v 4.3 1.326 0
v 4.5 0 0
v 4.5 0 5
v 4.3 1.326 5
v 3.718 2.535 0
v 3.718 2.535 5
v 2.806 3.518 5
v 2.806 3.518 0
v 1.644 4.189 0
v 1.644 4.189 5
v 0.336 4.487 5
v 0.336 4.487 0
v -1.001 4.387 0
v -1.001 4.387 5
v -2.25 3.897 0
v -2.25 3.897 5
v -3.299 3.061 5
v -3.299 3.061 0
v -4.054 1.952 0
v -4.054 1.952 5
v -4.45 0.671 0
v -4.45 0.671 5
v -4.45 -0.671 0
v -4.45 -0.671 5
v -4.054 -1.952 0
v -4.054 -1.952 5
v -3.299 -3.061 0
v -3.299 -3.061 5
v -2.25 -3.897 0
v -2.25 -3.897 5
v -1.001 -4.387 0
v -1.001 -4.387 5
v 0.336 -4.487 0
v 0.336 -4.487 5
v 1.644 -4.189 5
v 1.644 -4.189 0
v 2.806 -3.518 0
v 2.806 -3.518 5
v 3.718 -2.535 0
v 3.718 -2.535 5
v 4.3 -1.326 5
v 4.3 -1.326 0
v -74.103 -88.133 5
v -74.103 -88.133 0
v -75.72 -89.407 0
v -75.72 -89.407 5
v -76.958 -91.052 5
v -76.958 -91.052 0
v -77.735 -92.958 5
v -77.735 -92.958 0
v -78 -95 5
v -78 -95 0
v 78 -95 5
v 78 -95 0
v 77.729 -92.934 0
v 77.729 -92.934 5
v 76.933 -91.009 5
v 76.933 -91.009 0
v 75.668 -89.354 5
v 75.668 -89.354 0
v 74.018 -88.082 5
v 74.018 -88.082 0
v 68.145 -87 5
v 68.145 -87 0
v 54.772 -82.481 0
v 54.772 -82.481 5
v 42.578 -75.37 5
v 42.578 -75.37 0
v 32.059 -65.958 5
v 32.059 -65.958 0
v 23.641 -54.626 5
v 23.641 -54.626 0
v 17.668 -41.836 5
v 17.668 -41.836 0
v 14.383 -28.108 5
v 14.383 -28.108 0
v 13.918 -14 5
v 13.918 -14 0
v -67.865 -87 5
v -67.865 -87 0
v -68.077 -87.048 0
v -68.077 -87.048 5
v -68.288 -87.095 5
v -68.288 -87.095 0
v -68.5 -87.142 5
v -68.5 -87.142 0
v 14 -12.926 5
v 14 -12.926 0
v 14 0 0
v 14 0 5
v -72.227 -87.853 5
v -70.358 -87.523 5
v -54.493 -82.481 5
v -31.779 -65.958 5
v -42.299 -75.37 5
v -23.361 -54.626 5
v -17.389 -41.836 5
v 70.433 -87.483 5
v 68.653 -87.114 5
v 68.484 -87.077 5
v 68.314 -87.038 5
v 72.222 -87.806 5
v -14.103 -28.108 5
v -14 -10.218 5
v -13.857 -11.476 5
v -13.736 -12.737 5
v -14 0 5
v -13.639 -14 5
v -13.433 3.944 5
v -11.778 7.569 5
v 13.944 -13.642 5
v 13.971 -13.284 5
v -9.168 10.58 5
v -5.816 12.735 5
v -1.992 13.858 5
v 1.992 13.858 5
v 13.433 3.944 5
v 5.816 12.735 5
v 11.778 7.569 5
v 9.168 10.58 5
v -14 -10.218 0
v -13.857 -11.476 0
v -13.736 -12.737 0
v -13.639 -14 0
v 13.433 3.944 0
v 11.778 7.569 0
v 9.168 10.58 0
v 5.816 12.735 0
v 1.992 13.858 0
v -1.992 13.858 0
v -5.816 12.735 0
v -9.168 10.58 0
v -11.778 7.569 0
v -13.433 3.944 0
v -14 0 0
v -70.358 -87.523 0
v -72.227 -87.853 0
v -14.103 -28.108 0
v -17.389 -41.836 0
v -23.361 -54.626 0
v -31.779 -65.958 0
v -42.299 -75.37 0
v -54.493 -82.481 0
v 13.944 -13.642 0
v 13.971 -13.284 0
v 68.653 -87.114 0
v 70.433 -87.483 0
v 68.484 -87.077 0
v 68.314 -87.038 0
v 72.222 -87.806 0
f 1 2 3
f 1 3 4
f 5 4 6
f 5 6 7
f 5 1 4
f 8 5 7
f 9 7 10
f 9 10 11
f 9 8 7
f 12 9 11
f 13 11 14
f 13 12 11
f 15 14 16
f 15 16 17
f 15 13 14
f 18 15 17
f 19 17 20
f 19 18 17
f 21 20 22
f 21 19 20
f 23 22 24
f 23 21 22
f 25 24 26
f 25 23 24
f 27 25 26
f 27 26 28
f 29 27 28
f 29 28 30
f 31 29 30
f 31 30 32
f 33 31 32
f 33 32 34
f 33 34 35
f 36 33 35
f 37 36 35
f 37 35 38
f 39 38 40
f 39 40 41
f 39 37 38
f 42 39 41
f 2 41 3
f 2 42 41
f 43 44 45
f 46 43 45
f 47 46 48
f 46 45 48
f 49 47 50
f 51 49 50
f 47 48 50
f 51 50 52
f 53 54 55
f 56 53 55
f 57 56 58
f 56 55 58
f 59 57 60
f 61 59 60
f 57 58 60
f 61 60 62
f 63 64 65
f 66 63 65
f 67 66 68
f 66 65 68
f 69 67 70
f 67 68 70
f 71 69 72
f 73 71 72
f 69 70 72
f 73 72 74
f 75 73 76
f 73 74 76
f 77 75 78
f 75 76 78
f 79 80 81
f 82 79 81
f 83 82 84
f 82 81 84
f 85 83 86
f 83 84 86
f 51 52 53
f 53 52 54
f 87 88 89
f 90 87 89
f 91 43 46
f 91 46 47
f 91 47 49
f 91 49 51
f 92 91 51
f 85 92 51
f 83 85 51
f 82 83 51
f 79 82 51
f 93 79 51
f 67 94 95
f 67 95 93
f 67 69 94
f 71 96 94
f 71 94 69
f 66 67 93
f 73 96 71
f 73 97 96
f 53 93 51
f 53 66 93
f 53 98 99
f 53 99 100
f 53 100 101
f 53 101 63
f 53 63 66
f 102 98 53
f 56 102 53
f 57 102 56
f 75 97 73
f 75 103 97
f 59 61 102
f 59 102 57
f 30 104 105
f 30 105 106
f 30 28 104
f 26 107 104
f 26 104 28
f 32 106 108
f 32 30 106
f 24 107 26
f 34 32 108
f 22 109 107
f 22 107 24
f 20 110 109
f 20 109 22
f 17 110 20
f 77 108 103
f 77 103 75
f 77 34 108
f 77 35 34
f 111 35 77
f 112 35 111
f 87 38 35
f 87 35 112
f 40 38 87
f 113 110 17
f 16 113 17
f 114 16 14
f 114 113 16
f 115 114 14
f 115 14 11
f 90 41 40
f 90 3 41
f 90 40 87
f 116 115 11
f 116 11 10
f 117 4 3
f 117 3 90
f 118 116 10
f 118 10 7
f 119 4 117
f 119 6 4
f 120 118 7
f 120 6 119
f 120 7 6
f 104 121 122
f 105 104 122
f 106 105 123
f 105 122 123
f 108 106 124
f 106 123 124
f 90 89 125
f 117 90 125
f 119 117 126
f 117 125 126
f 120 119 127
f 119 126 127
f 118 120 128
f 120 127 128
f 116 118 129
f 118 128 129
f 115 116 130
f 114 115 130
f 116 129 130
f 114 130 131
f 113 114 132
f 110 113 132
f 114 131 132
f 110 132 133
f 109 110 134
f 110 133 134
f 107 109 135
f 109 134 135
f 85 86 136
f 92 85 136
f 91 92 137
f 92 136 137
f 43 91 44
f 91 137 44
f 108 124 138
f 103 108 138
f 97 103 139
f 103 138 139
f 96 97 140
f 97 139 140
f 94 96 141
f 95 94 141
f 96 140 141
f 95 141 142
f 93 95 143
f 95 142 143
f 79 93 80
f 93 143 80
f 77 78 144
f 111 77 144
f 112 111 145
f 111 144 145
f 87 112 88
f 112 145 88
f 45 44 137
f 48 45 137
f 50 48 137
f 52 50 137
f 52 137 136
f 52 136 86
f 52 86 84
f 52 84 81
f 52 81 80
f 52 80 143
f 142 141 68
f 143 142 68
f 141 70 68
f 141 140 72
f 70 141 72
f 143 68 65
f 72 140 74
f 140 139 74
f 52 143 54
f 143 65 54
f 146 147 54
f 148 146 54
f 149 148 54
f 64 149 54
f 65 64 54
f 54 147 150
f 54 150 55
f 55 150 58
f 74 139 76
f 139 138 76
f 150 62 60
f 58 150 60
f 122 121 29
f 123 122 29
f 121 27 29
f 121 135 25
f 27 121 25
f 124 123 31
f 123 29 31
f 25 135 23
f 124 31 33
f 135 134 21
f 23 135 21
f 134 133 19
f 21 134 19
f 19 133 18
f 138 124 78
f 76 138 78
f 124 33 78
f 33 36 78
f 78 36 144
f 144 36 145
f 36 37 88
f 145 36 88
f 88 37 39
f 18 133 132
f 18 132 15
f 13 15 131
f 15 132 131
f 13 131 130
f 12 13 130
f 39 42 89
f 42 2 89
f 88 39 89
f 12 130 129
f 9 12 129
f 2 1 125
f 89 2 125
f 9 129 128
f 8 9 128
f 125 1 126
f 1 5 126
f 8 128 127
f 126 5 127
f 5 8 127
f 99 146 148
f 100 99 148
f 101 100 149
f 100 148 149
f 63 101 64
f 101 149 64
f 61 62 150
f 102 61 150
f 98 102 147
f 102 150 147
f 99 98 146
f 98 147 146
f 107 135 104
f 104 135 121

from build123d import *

# Parameters (mm, degrees)
SKETCH1_R           = 4.5
BOSS_EXTRUDE1_DEPTH = 5


with BuildPart() as part:
    # Sketch1 → Boss-Extrude1 (new body)
    # profile 1 of 3: a face of its own
    with BuildSketch(Plane.XY):
        with BuildLine():
            ThreePointArc((-13.638726053, -14), (-27.283749808, -60.504713891), (-67.865456294, -87))
            Line((-67.865456294, -87), (68.145154779, -87))
            ThreePointArc((68.145154779, -87), (27.563448293, -60.504713891), (13.918424538, -14))
            Line((13.918424538, -14), (-13.638726053, -14))
        make_face()
    # profile 2 of 3: a face of its own
    with BuildSketch(Plane.XY):
        with BuildLine():
            ThreePointArc((-74.103488032, -88.132585205), (-76.958013519, -91.052083097), (-78, -95))
            Line((-78, -95), (78, -95))
            ThreePointArc((78, -95), (76.93342531, -91.009058574), (74.018096633, -88.082276426))
            ThreePointArc((74.018096633, -88.082276426), (71.326143577, -87.650491647), (68.653046275, -87.114207988))
            ThreePointArc((68.653046275, -87.114207988), (68.398994359, -87.05757613), (68.145154779, -87))
            Line((68.145154779, -87), (-67.865456294, -87))
            ThreePointArc((-67.865456294, -87), (-68.182334922, -87.071720966), (-68.499543017, -87.141970423))
            ThreePointArc((-68.499543017, -87.141970423), (-71.291444545, -87.694249722), (-74.103488032, -88.132585205))
        make_face()
    # profile 3 of 3: a face of its own
    with BuildSketch(Plane.XY):
        with BuildLine():
            ThreePointArc((-14, -10.217990633), (-13.793699897, -12.106543863), (-13.638726053, -14))
            Line((-13.638726053, -14), (13.918424538, -14))
            ThreePointArc((13.918424538, -14), (13.95714549, -13.462707887), (14, -12.925729658))
            Line((14, -12.925729658), (14, 0))
            ThreePointArc((14, 0), (0, 14), (-14, 0))
            Line((-14, 0), (-14, -10.217990633))
        make_face()
        Circle(SKETCH1_R, mode=Mode.SUBTRACT)
    extrude(amount=BOSS_EXTRUDE1_DEPTH)


solid = part.part
